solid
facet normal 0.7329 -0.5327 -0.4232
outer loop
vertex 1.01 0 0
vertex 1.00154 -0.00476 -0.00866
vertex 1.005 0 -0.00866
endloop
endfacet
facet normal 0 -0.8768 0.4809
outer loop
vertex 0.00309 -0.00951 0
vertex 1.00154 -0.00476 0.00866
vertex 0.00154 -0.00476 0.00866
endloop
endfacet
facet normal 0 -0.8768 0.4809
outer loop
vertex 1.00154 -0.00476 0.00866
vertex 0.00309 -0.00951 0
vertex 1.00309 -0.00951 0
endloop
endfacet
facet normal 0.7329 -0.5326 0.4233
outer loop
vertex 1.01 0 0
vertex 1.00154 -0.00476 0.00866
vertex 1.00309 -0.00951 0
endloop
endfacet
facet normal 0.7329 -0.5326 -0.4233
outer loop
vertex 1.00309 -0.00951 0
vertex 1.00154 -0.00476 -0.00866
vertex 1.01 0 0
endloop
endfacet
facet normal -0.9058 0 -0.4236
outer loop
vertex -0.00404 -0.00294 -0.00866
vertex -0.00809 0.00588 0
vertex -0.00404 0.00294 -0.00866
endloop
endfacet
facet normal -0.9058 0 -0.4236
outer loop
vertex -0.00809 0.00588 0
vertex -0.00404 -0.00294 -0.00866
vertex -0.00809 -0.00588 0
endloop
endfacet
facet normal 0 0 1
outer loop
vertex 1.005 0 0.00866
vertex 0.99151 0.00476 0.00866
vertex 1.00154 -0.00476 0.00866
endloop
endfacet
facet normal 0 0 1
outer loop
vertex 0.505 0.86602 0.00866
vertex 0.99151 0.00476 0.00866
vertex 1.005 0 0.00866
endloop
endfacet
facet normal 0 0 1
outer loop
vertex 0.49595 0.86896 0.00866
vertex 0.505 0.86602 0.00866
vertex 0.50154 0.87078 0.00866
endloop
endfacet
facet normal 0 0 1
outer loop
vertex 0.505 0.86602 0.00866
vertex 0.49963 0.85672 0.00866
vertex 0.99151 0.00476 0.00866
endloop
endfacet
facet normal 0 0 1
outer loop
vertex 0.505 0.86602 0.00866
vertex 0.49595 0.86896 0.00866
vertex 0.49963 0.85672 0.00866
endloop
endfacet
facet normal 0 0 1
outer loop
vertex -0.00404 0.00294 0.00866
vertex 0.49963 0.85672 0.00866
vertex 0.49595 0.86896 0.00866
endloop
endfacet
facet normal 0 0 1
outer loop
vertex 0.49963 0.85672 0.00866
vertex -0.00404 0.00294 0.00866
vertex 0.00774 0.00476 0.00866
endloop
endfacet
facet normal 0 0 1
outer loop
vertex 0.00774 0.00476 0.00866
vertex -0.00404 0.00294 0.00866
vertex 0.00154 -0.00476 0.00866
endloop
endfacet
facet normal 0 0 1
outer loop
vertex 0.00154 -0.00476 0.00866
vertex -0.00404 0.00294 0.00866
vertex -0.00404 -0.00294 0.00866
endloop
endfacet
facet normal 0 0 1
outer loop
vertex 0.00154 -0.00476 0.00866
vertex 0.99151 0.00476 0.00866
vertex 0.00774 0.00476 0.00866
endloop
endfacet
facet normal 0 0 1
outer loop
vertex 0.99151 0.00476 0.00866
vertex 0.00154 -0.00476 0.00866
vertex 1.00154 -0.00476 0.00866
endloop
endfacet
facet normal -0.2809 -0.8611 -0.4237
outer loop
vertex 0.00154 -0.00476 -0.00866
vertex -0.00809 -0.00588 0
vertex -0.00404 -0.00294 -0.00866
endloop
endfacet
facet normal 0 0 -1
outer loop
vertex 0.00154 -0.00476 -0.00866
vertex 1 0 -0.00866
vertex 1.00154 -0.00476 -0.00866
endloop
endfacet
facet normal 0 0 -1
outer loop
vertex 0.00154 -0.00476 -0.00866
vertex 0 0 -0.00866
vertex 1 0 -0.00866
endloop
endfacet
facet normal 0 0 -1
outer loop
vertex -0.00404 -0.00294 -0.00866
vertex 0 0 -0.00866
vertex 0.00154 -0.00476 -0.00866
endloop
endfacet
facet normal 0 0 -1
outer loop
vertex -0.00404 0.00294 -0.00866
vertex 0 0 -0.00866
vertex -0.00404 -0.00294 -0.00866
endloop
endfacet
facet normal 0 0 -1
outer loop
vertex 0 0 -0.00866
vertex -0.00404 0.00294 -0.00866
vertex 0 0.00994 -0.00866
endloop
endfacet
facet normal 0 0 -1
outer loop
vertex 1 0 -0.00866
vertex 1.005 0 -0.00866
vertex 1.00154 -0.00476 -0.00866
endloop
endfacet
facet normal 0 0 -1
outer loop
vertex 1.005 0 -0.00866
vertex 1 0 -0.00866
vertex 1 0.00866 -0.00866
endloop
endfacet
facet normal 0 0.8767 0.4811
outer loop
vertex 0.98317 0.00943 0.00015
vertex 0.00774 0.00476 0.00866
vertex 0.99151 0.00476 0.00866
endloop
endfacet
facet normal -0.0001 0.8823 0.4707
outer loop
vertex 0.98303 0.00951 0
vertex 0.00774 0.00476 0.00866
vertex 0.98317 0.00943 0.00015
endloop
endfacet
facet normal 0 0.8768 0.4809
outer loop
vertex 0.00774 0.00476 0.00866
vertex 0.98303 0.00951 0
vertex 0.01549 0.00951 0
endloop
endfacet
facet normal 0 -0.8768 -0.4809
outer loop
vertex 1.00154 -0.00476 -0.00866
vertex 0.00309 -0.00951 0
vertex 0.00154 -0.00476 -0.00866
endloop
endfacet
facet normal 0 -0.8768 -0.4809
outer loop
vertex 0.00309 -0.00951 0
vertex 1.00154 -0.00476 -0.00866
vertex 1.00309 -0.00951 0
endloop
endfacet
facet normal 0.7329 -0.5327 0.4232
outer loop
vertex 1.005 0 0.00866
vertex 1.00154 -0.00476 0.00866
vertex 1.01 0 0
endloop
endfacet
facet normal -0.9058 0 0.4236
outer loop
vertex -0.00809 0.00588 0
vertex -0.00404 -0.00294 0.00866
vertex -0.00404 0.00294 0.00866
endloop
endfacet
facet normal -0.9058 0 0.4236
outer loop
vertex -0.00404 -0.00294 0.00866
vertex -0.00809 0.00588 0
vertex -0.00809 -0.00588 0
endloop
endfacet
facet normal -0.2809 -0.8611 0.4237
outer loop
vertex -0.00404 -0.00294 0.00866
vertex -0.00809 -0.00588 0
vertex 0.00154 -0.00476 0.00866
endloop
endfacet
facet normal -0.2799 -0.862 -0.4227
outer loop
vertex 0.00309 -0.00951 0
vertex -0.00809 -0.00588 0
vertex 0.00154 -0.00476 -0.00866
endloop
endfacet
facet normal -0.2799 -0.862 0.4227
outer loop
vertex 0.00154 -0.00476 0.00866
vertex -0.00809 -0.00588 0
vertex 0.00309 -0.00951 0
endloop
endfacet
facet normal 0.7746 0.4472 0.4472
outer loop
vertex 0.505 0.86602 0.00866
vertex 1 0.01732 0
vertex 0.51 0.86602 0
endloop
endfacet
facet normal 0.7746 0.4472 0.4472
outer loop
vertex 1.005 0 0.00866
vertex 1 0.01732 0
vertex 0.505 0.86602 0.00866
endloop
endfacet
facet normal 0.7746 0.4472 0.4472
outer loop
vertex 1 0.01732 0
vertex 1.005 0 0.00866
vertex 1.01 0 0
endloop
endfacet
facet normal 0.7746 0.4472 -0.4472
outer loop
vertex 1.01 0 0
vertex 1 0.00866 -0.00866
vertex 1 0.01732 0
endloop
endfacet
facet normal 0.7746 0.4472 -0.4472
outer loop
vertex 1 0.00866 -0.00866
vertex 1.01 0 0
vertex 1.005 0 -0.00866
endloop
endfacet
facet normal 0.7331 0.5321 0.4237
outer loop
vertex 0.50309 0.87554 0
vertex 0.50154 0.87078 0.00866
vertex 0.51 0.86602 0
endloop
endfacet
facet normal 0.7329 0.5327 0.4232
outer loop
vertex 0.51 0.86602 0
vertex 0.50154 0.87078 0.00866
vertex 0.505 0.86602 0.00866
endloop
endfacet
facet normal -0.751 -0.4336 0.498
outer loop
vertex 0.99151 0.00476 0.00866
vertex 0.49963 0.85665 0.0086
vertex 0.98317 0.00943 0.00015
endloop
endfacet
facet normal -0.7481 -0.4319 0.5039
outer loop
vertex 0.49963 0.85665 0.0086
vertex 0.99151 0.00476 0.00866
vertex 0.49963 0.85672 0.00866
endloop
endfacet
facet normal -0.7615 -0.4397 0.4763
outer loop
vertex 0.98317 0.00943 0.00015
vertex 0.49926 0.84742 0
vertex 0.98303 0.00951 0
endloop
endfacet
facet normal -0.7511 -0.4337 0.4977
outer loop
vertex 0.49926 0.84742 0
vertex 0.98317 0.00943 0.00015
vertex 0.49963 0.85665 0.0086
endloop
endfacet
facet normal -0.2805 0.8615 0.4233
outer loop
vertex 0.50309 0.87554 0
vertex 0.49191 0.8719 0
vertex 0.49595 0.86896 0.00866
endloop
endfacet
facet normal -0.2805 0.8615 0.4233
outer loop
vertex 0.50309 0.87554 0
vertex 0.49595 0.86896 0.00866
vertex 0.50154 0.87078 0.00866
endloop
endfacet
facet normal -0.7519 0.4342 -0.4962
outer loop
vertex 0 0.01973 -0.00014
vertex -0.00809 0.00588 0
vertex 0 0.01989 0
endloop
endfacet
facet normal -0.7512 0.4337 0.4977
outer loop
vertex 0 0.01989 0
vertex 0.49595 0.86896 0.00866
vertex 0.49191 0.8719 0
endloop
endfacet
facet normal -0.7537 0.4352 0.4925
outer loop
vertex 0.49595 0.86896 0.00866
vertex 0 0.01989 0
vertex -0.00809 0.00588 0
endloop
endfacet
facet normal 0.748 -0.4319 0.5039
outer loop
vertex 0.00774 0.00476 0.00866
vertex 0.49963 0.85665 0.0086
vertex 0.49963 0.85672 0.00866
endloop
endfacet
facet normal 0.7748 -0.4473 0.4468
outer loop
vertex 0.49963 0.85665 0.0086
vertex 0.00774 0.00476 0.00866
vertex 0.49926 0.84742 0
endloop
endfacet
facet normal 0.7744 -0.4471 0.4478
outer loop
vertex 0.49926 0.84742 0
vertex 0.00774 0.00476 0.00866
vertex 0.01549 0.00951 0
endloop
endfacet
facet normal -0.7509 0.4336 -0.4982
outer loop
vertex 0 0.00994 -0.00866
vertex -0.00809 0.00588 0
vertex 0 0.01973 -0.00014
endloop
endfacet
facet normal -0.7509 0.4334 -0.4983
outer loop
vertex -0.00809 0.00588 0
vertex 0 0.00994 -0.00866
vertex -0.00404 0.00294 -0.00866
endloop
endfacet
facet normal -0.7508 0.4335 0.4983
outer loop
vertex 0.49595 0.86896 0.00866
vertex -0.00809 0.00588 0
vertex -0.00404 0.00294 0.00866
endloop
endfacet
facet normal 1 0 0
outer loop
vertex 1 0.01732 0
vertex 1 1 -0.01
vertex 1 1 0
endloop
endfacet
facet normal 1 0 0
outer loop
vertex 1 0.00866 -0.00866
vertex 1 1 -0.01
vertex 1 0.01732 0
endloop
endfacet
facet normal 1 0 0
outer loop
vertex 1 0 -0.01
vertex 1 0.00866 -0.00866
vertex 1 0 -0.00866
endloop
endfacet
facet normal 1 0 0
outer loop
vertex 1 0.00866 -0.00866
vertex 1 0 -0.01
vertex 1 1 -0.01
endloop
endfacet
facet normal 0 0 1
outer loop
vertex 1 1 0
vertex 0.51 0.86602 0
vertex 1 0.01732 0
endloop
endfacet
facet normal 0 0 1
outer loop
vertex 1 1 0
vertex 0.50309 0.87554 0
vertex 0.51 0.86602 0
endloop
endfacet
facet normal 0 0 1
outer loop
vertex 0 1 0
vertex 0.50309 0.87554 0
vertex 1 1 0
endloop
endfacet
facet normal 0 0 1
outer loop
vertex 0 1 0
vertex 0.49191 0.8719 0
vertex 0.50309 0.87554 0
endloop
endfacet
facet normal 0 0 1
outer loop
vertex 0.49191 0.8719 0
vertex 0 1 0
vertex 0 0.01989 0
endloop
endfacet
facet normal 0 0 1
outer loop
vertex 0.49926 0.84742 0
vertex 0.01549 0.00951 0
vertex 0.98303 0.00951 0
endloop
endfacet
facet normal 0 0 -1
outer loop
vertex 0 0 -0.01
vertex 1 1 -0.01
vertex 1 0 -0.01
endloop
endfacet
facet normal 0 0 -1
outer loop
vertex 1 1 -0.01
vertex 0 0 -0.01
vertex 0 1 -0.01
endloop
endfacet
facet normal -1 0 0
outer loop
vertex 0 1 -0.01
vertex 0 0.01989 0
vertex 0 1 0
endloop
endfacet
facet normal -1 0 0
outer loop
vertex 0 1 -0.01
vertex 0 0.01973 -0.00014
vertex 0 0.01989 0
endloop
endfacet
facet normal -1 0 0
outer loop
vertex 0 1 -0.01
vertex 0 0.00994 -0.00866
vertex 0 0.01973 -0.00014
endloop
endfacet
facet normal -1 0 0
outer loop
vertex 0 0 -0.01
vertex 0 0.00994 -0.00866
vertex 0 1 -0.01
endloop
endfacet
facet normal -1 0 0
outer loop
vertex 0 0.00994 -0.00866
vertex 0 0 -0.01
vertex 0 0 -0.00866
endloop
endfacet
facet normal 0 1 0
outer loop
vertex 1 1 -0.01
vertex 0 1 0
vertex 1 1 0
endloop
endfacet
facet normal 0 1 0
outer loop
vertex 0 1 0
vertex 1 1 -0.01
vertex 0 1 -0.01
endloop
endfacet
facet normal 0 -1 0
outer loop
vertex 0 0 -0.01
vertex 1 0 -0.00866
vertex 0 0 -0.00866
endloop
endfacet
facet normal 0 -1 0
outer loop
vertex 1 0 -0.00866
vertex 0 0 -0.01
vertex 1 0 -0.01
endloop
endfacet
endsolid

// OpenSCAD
hull(){
    translate([0.0, 0.0]) sphere(0.01);
    translate([1.0, 0.0]) sphere(0.01);
}
hull(){
    translate([1.0, 0.0]) sphere(0.01);
    translate([0.5, 0.8660254037844386]) sphere(0.01);
}
hull(){
    translate([0.5, 0.8660254037844386]) sphere(0.01);
    translate([0.0, 0.0]) sphere(0.01);
}
translate([0,0,-0.01]) color([0.1,0.1,0.1]) cube([1,1,0.01]);
